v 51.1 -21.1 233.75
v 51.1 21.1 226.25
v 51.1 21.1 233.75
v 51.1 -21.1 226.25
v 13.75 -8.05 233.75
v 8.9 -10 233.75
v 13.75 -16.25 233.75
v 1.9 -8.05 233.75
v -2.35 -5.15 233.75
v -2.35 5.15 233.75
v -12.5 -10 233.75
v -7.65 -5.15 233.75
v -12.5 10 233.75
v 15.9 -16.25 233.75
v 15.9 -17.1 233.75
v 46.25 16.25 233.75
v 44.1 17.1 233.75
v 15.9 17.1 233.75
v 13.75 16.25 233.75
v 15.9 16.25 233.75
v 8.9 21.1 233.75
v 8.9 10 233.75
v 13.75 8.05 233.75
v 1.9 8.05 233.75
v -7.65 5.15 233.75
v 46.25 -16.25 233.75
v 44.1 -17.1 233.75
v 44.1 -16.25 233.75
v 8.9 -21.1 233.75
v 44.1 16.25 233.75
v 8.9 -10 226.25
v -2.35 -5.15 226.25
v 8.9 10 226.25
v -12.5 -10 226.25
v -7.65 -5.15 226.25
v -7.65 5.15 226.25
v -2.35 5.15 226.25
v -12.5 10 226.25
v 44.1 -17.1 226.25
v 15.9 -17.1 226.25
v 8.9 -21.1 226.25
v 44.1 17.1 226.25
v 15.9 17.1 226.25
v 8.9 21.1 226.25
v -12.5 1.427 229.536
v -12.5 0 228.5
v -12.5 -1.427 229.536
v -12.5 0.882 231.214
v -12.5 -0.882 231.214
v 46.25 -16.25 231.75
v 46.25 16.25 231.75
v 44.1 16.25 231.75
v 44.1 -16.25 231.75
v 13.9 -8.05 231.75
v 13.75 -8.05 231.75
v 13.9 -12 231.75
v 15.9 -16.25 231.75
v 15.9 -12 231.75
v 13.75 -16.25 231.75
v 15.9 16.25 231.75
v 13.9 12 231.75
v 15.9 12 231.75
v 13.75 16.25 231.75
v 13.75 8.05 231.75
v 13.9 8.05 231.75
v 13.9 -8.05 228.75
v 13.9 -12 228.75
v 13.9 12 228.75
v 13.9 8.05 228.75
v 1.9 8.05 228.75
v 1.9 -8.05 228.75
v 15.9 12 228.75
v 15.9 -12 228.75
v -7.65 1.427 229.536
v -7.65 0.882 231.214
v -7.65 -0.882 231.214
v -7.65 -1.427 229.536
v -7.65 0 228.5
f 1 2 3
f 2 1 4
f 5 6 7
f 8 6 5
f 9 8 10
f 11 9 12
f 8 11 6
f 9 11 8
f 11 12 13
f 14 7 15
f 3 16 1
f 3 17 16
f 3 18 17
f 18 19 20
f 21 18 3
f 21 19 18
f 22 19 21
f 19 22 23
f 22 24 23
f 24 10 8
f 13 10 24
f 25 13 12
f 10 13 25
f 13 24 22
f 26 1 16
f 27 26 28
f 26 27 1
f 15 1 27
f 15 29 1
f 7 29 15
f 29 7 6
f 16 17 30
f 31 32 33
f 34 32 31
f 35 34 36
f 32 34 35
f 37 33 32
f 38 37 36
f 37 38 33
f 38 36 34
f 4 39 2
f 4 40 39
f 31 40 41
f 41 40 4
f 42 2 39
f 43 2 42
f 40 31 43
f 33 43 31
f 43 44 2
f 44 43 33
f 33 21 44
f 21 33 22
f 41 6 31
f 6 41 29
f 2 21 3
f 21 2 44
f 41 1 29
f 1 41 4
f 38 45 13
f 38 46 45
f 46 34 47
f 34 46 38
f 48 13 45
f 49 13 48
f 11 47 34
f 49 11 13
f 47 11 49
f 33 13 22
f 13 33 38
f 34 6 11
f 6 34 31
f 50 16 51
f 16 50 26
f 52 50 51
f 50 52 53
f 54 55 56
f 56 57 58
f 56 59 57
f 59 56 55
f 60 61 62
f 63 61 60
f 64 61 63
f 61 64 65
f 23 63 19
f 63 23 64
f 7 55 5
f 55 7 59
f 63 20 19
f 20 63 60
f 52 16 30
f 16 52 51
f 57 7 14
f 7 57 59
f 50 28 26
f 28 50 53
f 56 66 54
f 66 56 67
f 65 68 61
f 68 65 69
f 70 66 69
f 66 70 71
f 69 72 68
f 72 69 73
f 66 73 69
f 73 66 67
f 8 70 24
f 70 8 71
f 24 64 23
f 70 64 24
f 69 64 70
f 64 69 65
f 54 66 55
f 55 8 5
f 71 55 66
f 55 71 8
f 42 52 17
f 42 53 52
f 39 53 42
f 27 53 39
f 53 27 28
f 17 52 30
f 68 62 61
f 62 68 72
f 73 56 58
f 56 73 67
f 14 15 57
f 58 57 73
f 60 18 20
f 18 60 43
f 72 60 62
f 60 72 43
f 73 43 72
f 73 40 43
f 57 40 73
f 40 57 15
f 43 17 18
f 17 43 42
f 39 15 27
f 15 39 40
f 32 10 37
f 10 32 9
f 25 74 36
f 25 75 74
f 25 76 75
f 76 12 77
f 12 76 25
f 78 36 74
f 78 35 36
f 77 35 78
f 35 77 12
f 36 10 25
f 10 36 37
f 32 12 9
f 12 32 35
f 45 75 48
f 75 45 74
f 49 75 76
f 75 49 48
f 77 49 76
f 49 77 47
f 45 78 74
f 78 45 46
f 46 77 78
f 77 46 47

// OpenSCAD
/////////////////////////////////////////////////////////////////////////////////
/// FlyPi v0.97; 2015 05 27 ///
/// Collaboration Tom Baden, Lucia Prieto Godino and Andre Maia Chagas
/// 3D model by Tom Baden (thingyverse ID: tbaden) ///
/// thomas.baden@uni-tuebingen.de ///
/// tombaden.wordpress.com ///
/////////////////////////////////////////////////////////////////////////////////
//// SWITCHES //////////
PartA = 	0; // Base
PartA1=	0; // Base clamps
PartA2 = 	0; // Feet
PartB= 	    0; // Wall
PartB3=	0; // PCB mount
PartC= 	0; // Cam Mount
PartC1= 	0; // Cam Mount Servo
PartC2= 	0; // Cam Mount Cogwheels
PartC3=    1; // Cam V2 Mount 
PartD= 	0; // High Power LED mount
PartE= 	    0; // angled mounting stick
PartF1= 	0; // straight mounting stick, long
PartF2= 	0; // straight mounting stick, short
PartF3= 	0; // straight mounting stick, long 90°
PartG= 	0; // thumbscrew & manipulator links
PartH= 	0; // AdaFruit 8x8 LED Matrix mount
PartI= 	    0; // Adafruit 12 LED Ring mount
PartJ1= 	0; // Mini Petri dish mount
PartJ2= 	0; // Midi Petri dish mount
PartK= 	0; // Diffusor mount
PartL1= 	0; // microscope slide chamber small
PartL2= 	0; // microscope slide chamber big
PartM= 	0; // Fluorescence Excitation light mount
PartN= 	0; // Fluorescence Exitaton tube plug
PartO= 	0; // Fluorescence Emission mount and wheel

/////////////////////////////////////////////////////////////////////////////////
///// KEY VARIABLES ////////////////////////////////////////////
/////////////////////////////////////////////////////////////////////////////////
sep = 30; // How far apart do pieces "float" in the model
Walls = 5; // Global thickness of all walls
Tol = 0.15; // Global gap between all parts that need to slide

// Base and mainwall details
T_cableZ = 4; // Module A, height of thermistor cable slid
T_cableY = 12; // Module A,width of thermistor cable slid
T_cable_offset = 8; // Module A, lateral displacement of thermistor cable slid
MarkerLED_R = 3+Tol; // Module A, radius of RGB LED hole in base
MarkerLED_Z = 2; // Module A, depth beneath surface
MarkerLED_XY = 4; // Module A, viewhole size
Sidestand = 70; // Module A, extension in X dimension at the back of the base
Sidestand_thickness = Walls; // Module A, thickness of extension at back of base
Borders = 15; // Module B, thickness of borders on the back (saves plastic)
Walls_thinning = 4; // Module B, how much thinner than "Walls" is thin part (saves plastic)

//Peltier dimensions
P_XY = 40+1; // Size of the Peltier
P_Z = 3; // Thickness of the Peltier
P_border = 12; // Extension in X dimension of base next to Peltier
P_ridge = 2; // below Peltier, width of ridge
P_cable = 3; // thickness of Peltier cable slid

//Raspberry Pi type (mounting parameters)
RPi_Width = 56+Walls*2; // Dimensions of the RPi 2 (below also for RPi 2)
RPi_groundZ = 17; // 65; for RPi B (not RPi B+)
RPi_holedist_Y = 49/2; // 15.5; // for RPi B (not RPi B+)
RPi_holedist_Yb = 49/2; //-10; // for RPi B (not RPi B+)
RPi_holedist_Z = 58; //54.5; // for RPi B (not RPi B+)
Tube_wall = 1.5;
S_hole_R = 1.5;
S_mount_R = 4;
Mount_h = 19; // RPi2 mount

// RPi Camera Type
Cam_X = 32.2;//24 for "classic RPi Cam. i.e the one without the adjustable focus lens";
Cam_Y = 32.2;//25 for "classic RPi Cam";
Cam_X_offset = 0;// 2.5 for "classic RPi Cam";
C_Z = 2; // thickness of camera mount
C_Z2 = 5; // thickness of cmaera mount walls
C_ridge = 2; // width of ridge for camera mount
Cam_Zfloat = 200; // Module B, max height 
CamGroove_X = 12;
CamGroove_Y = 16.1;
CamGroove2_Y = 24;


/////////////////////////////////////////////////////////////////////////////////
/// MODULE A - base   //////////////////////////////////////////
/////////////////////////////////////////////////////////////////////////////////

A_Base_X = P_XY+P_border*2 + Walls + Sidestand;
A_Base_Y = RPi_Width;
A_Base_Z = 19;
A_Wall_X = Walls;
A_Wall_Y = A_Base_Y;
A_Wall_Y_long = 10;
A_Wall_Z = RPi_groundZ+RPi_holedist_Z+25;
A_Wall_Z_long = Cam_Zfloat+Walls;
A_extramount_Z = 100;
Stabiliser_R = 12;
Airhole_R = 6;
Airhole_spacing = 13;
A1_screw_R = 1.5;
A1_offset = 3;

module A(){
	translate([-A_Base_X/2+P_XY/2+P_border,0,-A_Base_Z/2]){cube([A_Base_X,A_Base_Y,A_Base_Z], center = true );} // BASE
	translate([-P_XY/2-P_border-Walls/2,A_Base_Y/2-Walls+Tol/2,0]){rotate ([90,0,0]) {cylinder($fn = 50, r = Stabiliser_R, h = Walls*2-Tol, center = true );}} // Support1	
	translate([-P_XY/2-P_border-Walls/2,-A_Base_Y/2+Walls-Tol/2,0]){rotate ([90,0,0]) {cylinder($fn = 50, r = Stabiliser_R, h = Walls*2-Tol, center = true );}} // Support2	
}
module A_sub(){
	translate([0,0,-P_Z/2]){cube([P_XY+2*Tol,P_XY+2*Tol,P_Z], center = true );} // Peltier groove
	translate([-A_Base_Y/4,(P_XY+2*Tol)/2-(P_cable+2*Tol)/2,-P_Z/2]){cube([A_Base_Y,P_cable+2*Tol,P_Z], center = true );} // Peltier cable1
	translate([-A_Base_Y/4,-(P_XY+2*Tol)/2+(P_cable+2*Tol)/2,-P_Z/2]){cube([A_Base_Y,P_cable+2*Tol,P_Z], center = true );} // Peltier cable1
	translate([-A_Base_Y/2,0,-MarkerLED_R-MarkerLED_Z]){rotate ([0,90,0]) {cylinder($fn = 50, r = MarkerLED_R, h = A_Base_Y, center = true );}} // MarkerLed HOLE
	translate([-P_XY/2-MarkerLED_XY/2-1,0,-MarkerLED_Z]){cube([MarkerLED_XY,MarkerLED_XY,2*MarkerLED_Z], center = true );} // MarkerLed opening
	translate([0,0,-A_Base_Z/2]){cube([P_XY-P_ridge*2,P_XY-P_ridge*2,A_Base_Z], center = true );} // Peltier below
	translate([-A_Base_X/2-Walls,0,-A_Base_Z/2]){cube([Sidestand-Walls*3,A_Base_Y-Walls*2,A_Base_Z], center = true );} // Sidestand Hole
	translate([-A_Base_X/2-Walls/2-Walls,0,-A_Base_Z/2+Sidestand_thickness]){cube([Sidestand-Walls*2,A_Base_Y,A_Base_Z], center = true );} // Sidestand Hole shallow
	translate([-P_XY/2-P_border-Walls/2,0,-A_Base_Z/2]){cube([Walls+Tol*2,A_Base_Y-Walls*4,A_Base_Z], center = true );} // Wall_linkhole
	translate([-P_XY/2-P_border-A_Wall_X/2,0,A_Wall_Z/2]){cube([A_Wall_X+Tol*2,A_Wall_Y,A_Wall_Z], center = true );} // Sidestand_slot
	translate([Airhole_spacing,0,-A_Base_Z/2]){rotate ([90,90,0]) {cylinder(r = Airhole_R, h = A_Base_Y, center = true );}} // Air holes
	translate([0,0,-A_Base_Z/2]){rotate ([90,90,0]) {cylinder(r = Airhole_R, h = A_Base_Y, center = true );}} // Air holes
	translate([-Airhole_spacing,0,-A_Base_Z/2]){rotate ([90,90,0]) {cylinder(r = Airhole_R, h = A_Base_Y, center = true );}} // Air holes
	translate([+A_Base_Y/2,0,-A_Base_Z/2]){rotate ([0,90,0]) {cylinder(r = Airhole_R, h = A_Base_Y, center = true );}} // Air holes
	translate([0,-Airhole_spacing,-A_Base_Z/2]){rotate ([0,90,0]) {cylinder(r = Airhole_R, h = A_Base_Y, center = true );}} // Air holes
	translate([0,Airhole_spacing,-A_Base_Z/2]){rotate ([0,90,0]) {cylinder(r = Airhole_R, h = A_Base_Y, center = true );}} // Air holes
	translate([-(P_XY/2-A1_offset),P_XY/2+A1_offset,-Walls]){rotate ([0,0,0]) {cylinder($fn=20, r = A1_screw_R, h = Walls*2, center = true );}} // screwhole
	translate([-(P_XY/2-A1_offset),-(P_XY/2+A1_offset),-Walls]){rotate ([0,0,0]) {cylinder($fn=20,r = A1_screw_R, h = Walls*2, center = true );}} // screwhole
	translate([(P_XY/2-A1_offset),P_XY/2+A1_offset,-Walls]){rotate ([0,0,0]) {cylinder($fn=20,r = A1_screw_R, h = Walls*2, center = true );}} // screwhole
	translate([(P_XY/2-A1_offset),-(P_XY/2+A1_offset),-Walls]){rotate ([0,0,0]) {cylinder($fn=20,r = A1_screw_R, h = Walls*2, center = true );}} // screwhole
}
if (PartA==1){difference(){A();A_sub();}}

/////////////////////////////////////////////////////////////////////////////////
//// MODULE A1 - thermistor /Peltier clamps /////
/////////////////////////////////////////////////////////////////////////////////

module A1(){
	translate([P_XY/2-A1_offset,P_XY/2+A1_offset,Walls*2]){cube([A1_offset*2,A1_offset*5,Walls/3], center = true );} // clamp
	translate([P_XY/2-A1_offset,P_XY/2+A1_offset*3,Walls*2-Walls/3]){cube([A1_offset*2,A1_offset,Walls/3], center = true );} // clamp
	translate([P_XY/2-A1_offset,-P_XY/2-A1_offset,Walls*2]){cube([A1_offset*2,A1_offset*5,Walls/3], center = true );} // clamp
	translate([P_XY/2-A1_offset,-P_XY/2-A1_offset*3,Walls*2-Walls/3]){cube([A1_offset*2,A1_offset,Walls/3], center = true );} // clamp
	translate([-P_XY/2+A1_offset,-P_XY/2-A1_offset,Walls*2]){cube([A1_offset*2,A1_offset*5,Walls/3], center = true );} // clamp
	translate([-P_XY/2+A1_offset,-P_XY/2-A1_offset*3,Walls*2-Walls/3]){cube([A1_offset*2,A1_offset,Walls/3], center = true );} // clamp
      translate([-P_XY/2+A1_offset,P_XY/2+A1_offset/4,Walls*2]){cube([A1_offset*2,A1_offset*6.5,Walls/3], center = true );} // Thermistor clamp
	translate([-P_XY/2+A1_offset,P_XY/2+A1_offset*3,7]){cube([A1_offset*2,A1_offset,5], center = true );} // Thermistor clamp footbig
	translate([-P_XY/2+A1_offset,P_XY/2-A1_offset*2.5,Walls*2-Walls/3]){cube([A1_offset*2,A1_offset,Walls/3], center = true );} // clamp
}
module A1_sub(){
	translate([-(P_XY/2-A1_offset),P_XY/2+A1_offset,Walls*2]){rotate ([0,0,0]) {cylinder($fn=20,r = A1_screw_R, h = Walls/2, center = true );}} // screwhole
	translate([-(P_XY/2-A1_offset),-(P_XY/2+A1_offset),Walls*2]){rotate ([0,0,0]) {cylinder($fn=20,r = A1_screw_R, h = Walls/2, center = true );}} // screwhole
	translate([(P_XY/2-A1_offset),P_XY/2+A1_offset,Walls*2]){rotate ([0,0,0]) {cylinder($fn=20,r = A1_screw_R, h = Walls/2, center = true );}} // screwhole
	translate([(P_XY/2-A1_offset),-(P_XY/2+A1_offset),Walls*2]){rotate ([0,0,0]) {cylinder($fn=20,r = A1_screw_R, h = Walls/2, center = true );}} // screwhole
}
if (PartA1==1) {difference(){A1();A1_sub();}}

/////////////////////////////////////////////////////////////////////////////////
/// MODULE A2 - basefeet   /////////////////////////////////
/////////////////////////////////////////////////////////////////////////////////

A_Foot_Z = 30;
A_Foot_Groove_Z = 3;
A_Foot_Corners_XY = 10;

module A2(){
	translate([-A_Base_X/2+P_XY/2+P_border,0,-A_Foot_Z/2-sep]){cube([A_Base_X+Walls,A_Base_Y+Walls,A_Foot_Z], center = true );} // Main foot
	
}
module A2_sub(){
	//translate([0,0,-A_Foot_Z/2-sep]){cube([P_XY-P_ridge*2,P_XY-P_ridge*2,A_Foot_Z], center = true );} // Peltier below
	translate([-A_Base_X/2+P_XY/2+P_border,0,-A_Foot_Groove_Z/2-sep]){cube([A_Base_X+Tol,A_Base_Y+Tol,A_Foot_Groove_Z], center = true );} // BASE

	translate([-A_Base_X/2+P_XY/2+P_border,0,-A_Foot_Z/2-sep]){cube([A_Base_X-Walls,A_Base_Y-Walls,A_Foot_Z], center = true );} // Main Hole
	
	translate([-A_Base_X/2+P_XY/2+P_border,0,-A_Foot_Z/2+Walls/2-sep]){cube([A_Base_X-Walls-A_Foot_Corners_XY,A_Base_Y*2,A_Foot_Z-Walls], center = true );} // CornerCut Hole1
	translate([-A_Base_X/2+P_XY/2+P_border,0,-A_Foot_Z/2+Walls/2-sep]){cube([A_Base_X*2,A_Base_Y-Walls-A_Foot_Corners_XY,A_Foot_Z-Walls], center = true );}  // CornerCut Hole2


}
if (PartA2==1){difference(){A2();A2_sub();}}

/////////////////////////////////////////////////////////////////////////////////
///// MODULE B - main wall //////////////////////////////////
/////////////////////////////////////////////////////////////////////////////////

module B(){
	translate([-P_XY/2-P_border-A_Wall_X/2,0,A_Wall_Z/2+sep]){cube([A_Wall_X,A_Wall_Y,A_Wall_Z], center = true );} // WALL
	translate([-P_XY/2-P_border-A_Wall_X/2,0,A_Wall_Z_long/2+sep]){cube([A_Wall_X,A_Wall_Y_long,A_Wall_Z_long], center = true );} // WALL_extra
	translate([-P_XY/2-P_border-A_Wall_X/2,0,0.5+sep-A_Base_Z/2]){cube([Walls,A_Base_Y-Walls*4-Tol*2,A_Base_Z], center = true );} // WALL_link
	translate([-P_XY/2-P_border-A_Wall_X/2,0,A_Wall_Z+sep-A_Wall_Y/999]){rotate ([0,270,0]) {cylinder($fn = 3, r = A_Wall_Y/2, h = Walls, center = true );}} // WALL_rounding top
}
module B2(){
	translate([-P_XY/2-P_border+1.7*Walls-Mount_h,RPi_holedist_Yb,RPi_groundZ+sep]){rotate ([0,90,0]) {cylinder(r = S_mount_R, h = Mount_h, center = true );}} // m hole_bottom
	translate([-P_XY/2-P_border+1.7*Walls-Mount_h,RPi_holedist_Y,RPi_groundZ+RPi_holedist_Z+sep]){rotate ([0,90,0]) {cylinder(r = S_mount_R, h = Mount_h, center = true );}} // m hole_top
	translate([-P_XY/2-P_border+1.7*Walls-Mount_h,-RPi_holedist_Yb,RPi_groundZ+sep]){rotate ([0,90,0]) {cylinder(r = S_mount_R, h = Mount_h, center = true );}} // m hole_bottom
	translate([-P_XY/2-P_border+1.7*Walls-Mount_h,-RPi_holedist_Y,RPi_groundZ+RPi_holedist_Z+sep]){rotate ([0,90,0]) {cylinder(r = S_mount_R, h = Mount_h, center = true );}} // m hole_top
}
module B_sub(){
	translate([-A_Base_Y/4,(P_XY+2*Tol)/2-(P_cable+2*Tol)/2+P_cable/2,-P_Z/2+sep]){cube([A_Base_Y,P_cable*2+2*Tol,P_Z], center = true );} // Peltier cable1
	translate([-A_Base_Y/4,-(P_XY+2*Tol)/2+(P_cable+2*Tol)/2-P_cable/2,-P_Z/2+sep]){cube([A_Base_Y,P_cable*2+2*Tol,P_Z], center = true );} // Peltier cable2
	translate([-A_Base_Y/4,T_cable_offset,T_cableZ/2+Tol+sep]){cube([A_Base_Y,T_cableY,T_cableZ+2*Tol], center = true );} // thermistor cable
	translate([-A_Base_Y/2,0,-MarkerLED_R-MarkerLED_Z+sep]){rotate ([0,90,0]) {cylinder($fn = 50, r = MarkerLED_R, h = A_Base_Y, center = true );}} // MarkerLed HOLE
	translate([-P_XY/2-P_border-A_Wall_X/2-(Walls-Walls_thinning)/2,0,A_Wall_Z/2+sep]){cube([Walls_thinning,A_Wall_Y-Borders,A_Wall_Z-Borders], center = true );} // Save Material	
}
module B2_sub(){
	translate([-P_XY/2-P_border+Walls-Mount_h,RPi_holedist_Yb,RPi_groundZ+sep]){rotate ([0,90,0]) {cylinder($fn = 50, r = S_hole_R, h = Mount_h+Walls, center = true );}} // m hole_bottom
	translate([-P_XY/2-P_border+Walls-Mount_h,RPi_holedist_Y,RPi_groundZ+RPi_holedist_Z+sep]){rotate ([0,90,0]) {cylinder($fn = 50, r = S_hole_R, h = Mount_h+Walls, center = true );}} // 
	translate([-P_XY/2-P_border+Walls-Mount_h,-RPi_holedist_Yb,RPi_groundZ+sep]){rotate ([0,90,0]) {cylinder($fn = 50, r = S_hole_R, h = Mount_h+Walls, center = true );}} // m hole_bottom
	translate([-P_XY/2-P_border+Walls-Mount_h,-RPi_holedist_Y,RPi_groundZ+RPi_holedist_Z+sep]){rotate ([0,90,0]) {cylinder($fn = 50, r = S_hole_R, h = Mount_h+Walls, center = true );}} // 
}
if (PartB==1){difference(){B();B_sub();}}
if (PartB==1){difference(){B2();B2_sub();}}

/////////////////////////////////////////////////////////////////////////////////
///// MODULE B3 - Arduino/Fritzing holder ////////
/////////////////////////////////////////////////////////////////////////////////

Fritzing_X = 1.65;
Fritzing_Y = 76.75;
Fritzing_Z_depth = 3;
Mount2_h = 25;
Mount2_Z = 4;
Ard_holder_X = Walls*2 + Fritzing_X;
Ard_holder_Y = Fritzing_Y + 2*Walls;
Ard_z_extra = 5;
Ard_holder_Z = 2*S_mount_R+Ard_z_extra;
Foot_Z_extra = 2;
LShape_Length = 6;
LShape_Width = 3;

module B3(){
	translate([-P_XY/2-P_border-Ard_holder_X/2-2*sep,0,RPi_groundZ+sep+Ard_z_extra/2]){cube([Ard_holder_X,Ard_holder_Y,Ard_holder_Z], center = true );} // Holder
	translate([-P_XY/2-P_border+1.7*Walls-Mount_h-2*sep+Mount2_h/2,RPi_holedist_Yb,RPi_groundZ+sep-S_mount_R/2+Foot_Z_extra/2]){cube([Mount2_h,S_mount_R*2,S_mount_R+Foot_Z_extra], center = true );} // foot
	translate([-P_XY/2-P_border+1.7*Walls-Mount_h-2*sep+Mount2_h/2,-RPi_holedist_Yb,RPi_groundZ+sep-S_mount_R/2+Foot_Z_extra/2]){cube([Mount2_h,S_mount_R*2,S_mount_R+Foot_Z_extra], center = true );} // foot
}
module B3_sub(){
	translate([-P_XY/2-P_border-Ard_holder_X/2-2*sep,0,RPi_groundZ+Ard_holder_Z/2-Fritzing_Z_depth/2+sep]){cube([Fritzing_X+Tol,Fritzing_Y+2*Tol,Fritzing_Z_depth+Ard_z_extra], center = true );} // slot
	translate([-P_XY/2-P_border-Ard_holder_X/2-2*sep,0,RPi_groundZ+sep+Ard_holder_Z/2]){cube([Ard_holder_X,Fritzing_Y-2,Ard_z_extra], center = true );} // Holder
	translate([-P_XY/2-P_border+1.7*Walls-Mount_h-2*sep+Mount2_h/2,RPi_holedist_Yb,RPi_groundZ+sep]){rotate ([0,90,0]) {cylinder(r = S_hole_R, h = Mount2_h+5, center = true );}} // m hole_bottom
	translate([-P_XY/2-P_border+1.7*Walls-Mount_h-2*sep+Mount2_h/2,-RPi_holedist_Yb,RPi_groundZ+sep]){rotate ([0,90,0]) {cylinder(r = S_hole_R, h = Mount2_h+5, center = true );}} // m hole_bottom
    translate([-P_XY/2-P_border+1.7*Walls-Mount_h-2*sep+Mount2_h-LShape_Length/2,RPi_holedist_Yb-S_mount_R+LShape_Width/2,RPi_groundZ+sep-S_mount_R/2+Foot_Z_extra/2]){cube([LShape_Length,LShape_Width,S_mount_R+Foot_Z_extra], center = true );} // L-Shape
	translate([-P_XY/2-P_border+1.7*Walls-Mount_h-2*sep+Mount2_h-LShape_Length/2,-RPi_holedist_Yb+S_mount_R-LShape_Width/2,RPi_groundZ+sep-S_mount_R/2+Foot_Z_extra/2]){cube([LShape_Length,LShape_Width,S_mount_R+Foot_Z_extra], center = true );} // L-Shape    
}
if (PartB3==1){difference(){B3();B3_sub();}}

/////////////////////////////////////////////////////////////////////////////////
///// MODULE C - camera mount /////////////////////////
/////////////////////////////////////////////////////////////////////////////////

MiniGrooveX = 15;

module C(){
	translate([sep+Cam_X_offset,0,Cam_Zfloat+sep]){cube([Cam_X+Walls*2,Cam_Y+Walls*2,Walls*1.5], center = true );} // Cam_mount
	translate([sep-P_XY/4-P_border/2-Walls,0,Cam_Zfloat+sep]){cube([P_XY/2+P_border+2*Walls,A_Wall_Y_long+2*Walls,Walls*1.5], center = true );} // Cam_link
}
module C_sub(){
	translate([sep+Cam_X_offset,0,Cam_Zfloat+sep+Walls*0.75-C_Z/2]){cube([Cam_X+Tol*2,Cam_Y+Tol*2,C_Z], center = true );} // Cam_hole_ridge
	translate([sep+Cam_X_offset-Cam_X/2-CamGroove_X/2,0,Cam_Zfloat+sep+C_Z2/2]){cube([CamGroove_X,CamGroove_Y,C_Z2+Walls/2], center = true );} // Cam_cable_groove
	translate([sep+Cam_X_offset+Cam_X/2-MiniGrooveX/2-C_ridge,-Cam_Y/2+C_ridge/2,Cam_Zfloat+sep+C_Z2/2]){cube([MiniGrooveX,C_ridge,C_Z2+Walls/2], center = true );} // mini groove
	translate([sep+Cam_X_offset-Cam_X/2+CamGroove_X/2,0,Cam_Zfloat+sep+C_Z2/2]){cube([CamGroove_X,CamGroove2_Y,C_Z2+Walls/2], center = true );} // Cam_bmup_groove
	translate([sep+Cam_X_offset,0,Cam_Zfloat+sep]){cube([Cam_X-C_ridge*2,Cam_Y-C_ridge*2,Walls*3], center = true );} // Cam_hole
	translate([sep-P_XY/2-P_border-Walls/2,0,Cam_Zfloat+sep]){cube([Walls+Tol*2,A_Wall_Y_long+2*Tol,Walls*1.5], center = true );} // Cam_link_hole
	translate([sep-Cam_X/2-CamGroove_X-15,0,Cam_Zfloat+sep]){rotate ([0,90,0]) {cylinder(r = S_hole_R, h = 20, center = true );}} // screwhole
}
if (PartC==1){difference(){C();C_sub();}}


/////////////////////////////////////////////////////////////////////////////////
///// MODULE C1 - camera mount with servo ////
/////////////////////////////////////////////////////////////////////////////////

Servo_Y = 12.2;
Servo_X = 23.7;
Servo_X_offset = 5.5;
// height of Servo is 29 in total, which is counted from the bottom
cogwheel_R = 14.1;
cogwheel_R2 = 10.5;
cogwheel_Z = 10;
cogwheel_Z2 = 4;
cogwheel_nteeth = 30; // should be divisible by 3
cogwheel_R_inner1 = 7+Tol; // camera radius
cogwheel_R_inner2 = 3.7+Tol/2; // servo axis radius
cogwheel_cross_Z = 3;
cogwheel_cross_Width = 4.5+Tol;
cogwheel_cross_Length = cogwheel_R2*2-1;

module C1(){
	translate([sep+Cam_X_offset,-2*sep-Walls/2-Servo_Y/2,Cam_Zfloat+sep]){cube([Cam_X+Walls*2,Cam_Y+Servo_Y+Walls*3,Walls*1.5], center = true );} // Cam_mount
	translate([sep-P_XY/4-P_border/2-Walls,-2*sep,Cam_Zfloat+sep]){cube([P_XY/2+P_border+2*Walls,A_Wall_Y_long+2*Walls,Walls*1.5], center = true );} // Cam_link

}
module C1_sub(){
	translate([sep+Cam_X_offset,-2*sep,Cam_Zfloat+sep+Walls*0.75-C_Z/2]){cube([Cam_X+Tol*2,Cam_Y+Tol*2,C_Z], center = true );} // Cam_hole_ridge
	translate([sep+Cam_X_offset-Cam_X/2-CamGroove_X/2,-2*sep,Cam_Zfloat+sep+C_Z2/2]){cube([CamGroove_X,CamGroove_Y,C_Z2+Walls/2], center = true );} // Cam_cable_groove
	translate([sep+Cam_X_offset+Cam_X/2-MiniGrooveX/2-C_ridge,-Cam_Y/2+C_ridge/2-2*sep,Cam_Zfloat+sep+C_Z2/2]){cube([MiniGrooveX,C_ridge,C_Z2+Walls/2], center = true );} // mini groove
	translate([sep+Cam_X_offset-Cam_X/2+CamGroove_X/2,-2*sep,Cam_Zfloat+sep+C_Z2/2]){cube([CamGroove_X,CamGroove2_Y,C_Z2+Walls/2], center = true );} // Cam_bmup_groove
	translate([sep+Cam_X_offset,-2*sep,Cam_Zfloat+sep]){cube([Cam_X-C_ridge*2,Cam_Y-C_ridge*2,Walls*3], center = true );} // Cam_hole
	translate([sep-P_XY/2-P_border-Walls/2,-2*sep,Cam_Zfloat+sep]){cube([Walls+Tol*2,A_Wall_Y_long+2*Tol,Walls*1.5], center = true );} // Cam_link_hole
	translate([sep-Cam_X/2-CamGroove_X-15,-2*sep,Cam_Zfloat+sep]){rotate ([0,90,0]) {cylinder(r = S_hole_R, h = 20, center = true );}} // screwhole
      translate([sep+Cam_X_offset-Servo_X_offset,-2*sep-Servo_Y/2-Cam_Y/2-Walls,Cam_Zfloat+sep]){cube([Servo_X+Tol,Servo_Y+Tol,Walls*3], center = true );} // Servo_hole
 translate([sep+Cam_X_offset-Servo_X_offset+Servo_X/2,-2*sep-Servo_Y/2-Cam_Y/2-Walls,Cam_Zfloat+sep]){cylinder( $fn=50, r = 4, h = 100, center = true );} // Servo_cablegroove

}
if (PartC1==1){difference(){C1();C1_sub();}}

module C2(){
      for (i = [0 : cogwheel_nteeth/3]) {
		translate([sep+Cam_X_offset,-2*sep,Cam_Zfloat+2*sep]){rotate ([0,0,(i+0.5)*360/cogwheel_nteeth]) {cylinder($fn = 3, r = cogwheel_R, h = cogwheel_Z, center = true );}} // cogs wheel 1
		translate([sep+Cam_X_offset,-2*sep-Servo_Y/2-Cam_Y/2-Walls,Cam_Zfloat+2*sep]){rotate ([0,0,i*360/cogwheel_nteeth]) {cylinder($fn = 3, r = cogwheel_R, h = cogwheel_Z, center = true );}} // cogs wheel 2
	}
}
module C2_sub(){
	translate([sep+Cam_X_offset,-2*sep,Cam_Zfloat+2*sep]){rotate ([0,0,0]) {cylinder($fn = 50, r = cogwheel_R_inner1, h = cogwheel_Z+1, center = true );}} // Cam_cog Lens hole 
	translate([sep+Cam_X_offset,-2*sep,Cam_Zfloat+2*sep+cogwheel_Z2/2+1]){rotate ([0,0,0]) {cylinder($fn = 50, r = cogwheel_R2, h = cogwheel_Z-cogwheel_Z2+1, center = true );}} // Cam_cog main hole
	
	translate([sep+Cam_X_offset,-2*sep-Servo_Y/2-Cam_Y/2-Walls,Cam_Zfloat+2*sep+cogwheel_Z2/2+1]){rotate ([0,0,0]) {cylinder($fn = 50, r = cogwheel_R2, h = cogwheel_Z - cogwheel_Z2+1, center = true );}} // Servo_cog main hole
	translate([sep+Cam_X_offset,-2*sep-Servo_Y/2-Cam_Y/2-Walls,Cam_Zfloat+2*sep]){rotate ([0,0,0]) {cylinder($fn = 12, r = cogwheel_R_inner2, h = cogwheel_Z+1, center = true );}} // Servo_cog mount hole
	translate([sep+Cam_X_offset,-2*sep-Servo_Y/2-Cam_Y/2-Walls,Cam_Zfloat+2*sep-cogwheel_cross_Z/2]){cube([cogwheel_cross_Length,cogwheel_cross_Width,cogwheel_cross_Z], center = true);} // Servo_cog cross1
	translate([sep+Cam_X_offset,-2*sep-Servo_Y/2-Cam_Y/2-Walls,Cam_Zfloat+2*sep-cogwheel_cross_Z/2]){cube([cogwheel_cross_Width,cogwheel_cross_Length,cogwheel_cross_Z], center = true);} // Servo_cog cross2

}
if (PartC2==1){difference(){C2();C2_sub();}}

/////////////////////////////////////////////////////////////////////////////////
///// MODULE C3 - camera mount /////////////////////////
/////////////////////////////////////////////////////////////////////////////////

MiniGrooveX = 15;

module C3(){
	translate([sep+Cam_X_offset,0,Cam_Zfloat+sep]){cube([Cam_X+Walls*2,Cam_Y+Walls*2,Walls*1.5], center = true );} // Cam_mount
	translate([sep-P_XY/4-P_border/2-Walls,0,Cam_Zfloat+sep]){cube([P_XY/2+P_border+2*Walls,A_Wall_Y_long+2*Walls,Walls*1.5], center = true );} // Cam_link
}
module C3_sub(){
	translate([sep+Cam_X_offset,0,Cam_Zfloat+sep+Walls*0.75-C_Z/2]){cube([Cam_X+Tol*2,Cam_Y+Tol*2,C_Z], center = true );} // Cam_hole_ridge
	translate([sep+Cam_X_offset-Cam_X/2-CamGroove_X/2,0,Cam_Zfloat+sep+C_Z2/2]){cube([CamGroove_X,CamGroove_Y,C_Z2+Walls/2], center = true );} // Cam_cable_groove
	translate([sep+Cam_X_offset+Cam_X/2-MiniGrooveX/2-C_ridge,-Cam_Y/2+C_ridge/2,Cam_Zfloat+sep+C_Z2/2]){cube([MiniGrooveX,C_ridge,C_Z2+Walls/2], center = true );} // mini groove
	translate([sep+Cam_X_offset-Cam_X/2+CamGroove_X/2,0,Cam_Zfloat+sep+C_Z2/2]){cube([CamGroove_X,CamGroove2_Y,C_Z2+Walls/2], center = true );} // Cam_bmup_groove
	translate([sep+Cam_X_offset,0,Cam_Zfloat+sep]){cube([Cam_X-C_ridge*2,Cam_Y--2,Walls*3], center = true );} // Cam_hole
	translate([sep-P_XY/2-P_border-Walls/2,0,Cam_Zfloat+sep]){cube([Walls+Tol*2,A_Wall_Y_long+2*Tol,Walls*1.5], center = true );} // Cam_link_hole
	translate([sep-Cam_X/2-CamGroove_X-15,0,Cam_Zfloat+sep]){rotate ([0,90,0]) {cylinder(r = S_hole_R, h = 20, center = true );}} // screwhole
}
if (PartC3==1){difference(){C3();C3_sub();}}

/////////////////////////////////////////////////////////////////////////////////
///// MODULE D - high power LED mount  /////////
/////////////////////////////////////////////////////////////////////////////////

Tube_wall = 1.5;
LED_holder_inside = 35+2*Tol;
LED_holder_outside = 35+2*Tol+2*Walls;
LED_holder_ridge = 3;

module D(){
	translate([sep+Cam_X_offset,0,Cam_Zfloat]){cube([Cam_X+Walls*2,Cam_Y+Walls*2,Walls*1.5], center = true );} // Cam_mount
	translate([sep-P_XY/4-P_border/2-Walls,0,Cam_Zfloat]){cube([P_XY/2+P_border+2*Walls,A_Wall_Y_long+2*Walls,Walls*1.5], center = true );} // Cam_link
}
module D_sub(){
	translate([sep+Cam_X_offset,0,Cam_Zfloat]){cylinder(r = Excit_hole_R+Tube_wall+Tol, h = Walls*2, center = true );} 
	translate([sep+Cam_X_offset,0,Cam_Zfloat+Walls*0.4]){cube([LED_holder_inside,LED_holder_inside,Walls], center = true );} // LED_holder_groove2
	translate([sep-P_XY/2-P_border-Walls/2,0,Cam_Zfloat]){cube([Walls+Tol*2,A_Wall_Y_long+2*Tol,Walls*1.5], center = true );} // Cam_link_hole
	translate([sep-Cam_X/2-CamGroove_X-15,0,Cam_Zfloat]){rotate ([0,90,0]) {cylinder(r = S_hole_R, h = 20, center = true );}} // screwhole
}
if (PartD==1){difference(){D();D_sub();}}

/////////////////////////////////////////////////////////////////////////////////
///// MODULE E - angled pillars  //////////////////////////
/////////////////////////////////////////////////////////////////////////////////

E_Y_extra = 35;
E_Z_extra = 40;
E_extra_angle = -40;
E_extra_angle2 = -30;

module E(){
		translate([-P_XY/2-P_border-Walls/2,2*sep,Cam_Zfloat]){cube([3*Walls,A_Wall_Y_long+2*Walls,Walls*1.5], center = true );} // Cam_link
		translate([-P_XY/2-P_border-Walls/2,2*sep+E_Y_extra/2,Cam_Zfloat]){cube([Walls,A_Wall_Y_long+2*Walls+E_Y_extra,Walls*1.5], center = true );} // Arm
            translate([-P_XY/2-P_border-A_Wall_X/2,2*sep+E_Y_extra-sin(E_extra_angle)*E_Z_extra-10,Cam_Zfloat+E_Z_extra/2-5]) {rotate ([E_extra_angle,0,0]) {cube([A_Wall_X,A_Wall_Y_long,E_Z_extra], center = true );}} // W_extra1
		translate([-P_XY/2-P_border-A_Wall_X/2,2*sep+E_Y_extra-15-sin(E_extra_angle2)*E_Z_extra-10,Cam_Zfloat+E_Z_extra/2-3]) {rotate ([E_extra_angle2,0,0]) {cube([A_Wall_X,A_Wall_Y_long*0.6,E_Z_extra], center = true );}} // W_extra2
}
module E_sub(){
	translate([-P_XY/2-P_border-Walls/2,2*sep,Cam_Zfloat]){cube([Walls+Tol*2,A_Wall_Y_long+2*Tol,Walls*10], center = true );} // Cam_link_hole
	translate([-Cam_X/2-CamGroove_X-15,2*sep,Cam_Zfloat]){rotate ([0,90,0]) {cylinder(r = S_hole_R, h = 100, center = true );}} // screwhole
}
if (PartE==1){difference(){E();E_sub();}}

/////////////////////////////////////////////////////////////////////////////////
///// MODULE F1 - extra pillar stick 1 //////////////////
/////////////////////////////////////////////////////////////////////////////////

F_Plug_X = 15;
Airhole_R2 = 4;

module F1(){
	translate([0,-A_Base_Y/2-A_Wall_X/2-sep,A_extramount_Z/2+10-A_Base_Z/2]){cube([A_Wall_Y_long,A_Wall_X,A_extramount_Z+20+A_Base_Z], center = true );} // low_mount
	translate([0,-A_Base_Y/2-A_Wall_X/2-sep,-A_Base_Z/2]){cube([A_Wall_Y_long*4,A_Wall_X,A_Base_Z], center = true );} // low_mount
	translate([Airhole_spacing,-A_Base_Y/2-A_Wall_X/2-sep+F_Plug_X/2,-A_Base_Z/2]){rotate ([90,90,0]) {cylinder(r = Airhole_R-Tol, h = F_Plug_X, center = true );}} // Plug hole1
	translate([0,-A_Base_Y/2-A_Wall_X/2-sep+F_Plug_X/2,-A_Base_Z/2]){rotate ([90,90,0]) {cylinder(r = Airhole_R-Tol, h = F_Plug_X, center = true );}} // Plug hole2
	translate([-Airhole_spacing,-A_Base_Y/2-A_Wall_X/2-sep+F_Plug_X/2,-A_Base_Z/2]){rotate ([90,90,0]) {cylinder(r = Airhole_R-Tol, h = F_Plug_X, center = true );}} // Plug hole3
}
module F1_sub(){
	translate([Airhole_spacing,-A_Base_Y/2-A_Wall_X/2-sep+F_Plug_X/2,-A_Base_Z/2]){rotate ([90,90,0]) {cylinder(r = Airhole_R-Tube_wall, h = F_Plug_X*2, center = true );}} // Air holes
	translate([0,-A_Base_Y/2-A_Wall_X/2-sep+F_Plug_X/2,-A_Base_Z/2]){rotate ([90,90,0]) {cylinder(r = Airhole_R-Tube_wall, h = F_Plug_X*2, center = true );}} // Air holes
	translate([-Airhole_spacing,-A_Base_Y/2-A_Wall_X/2-sep+F_Plug_X/2,-A_Base_Z/2]){rotate ([90,90,0]) {cylinder(r = Airhole_R-Tube_wall, h = F_Plug_X*2, center = true );}} // Air holes
}
if (PartF1==1){difference(){F1();F1_sub();}}

/////////////////////////////////////////////////////////////////////////////////
///// MODULE F2 - extra pillar stick 2 (mini)    ////
/////////////////////////////////////////////////////////////////////////////////

Ministick_Z = 15;

module F2(){
	translate([2*sep,-A_Base_Y/2-A_Wall_X/2-sep,Ministick_Z/2-A_Base_Z/2]){cube([A_Wall_Y_long,A_Wall_X,A_Base_Z+Ministick_Z], center = true );} // low_mount
	translate([2*sep,-A_Base_Y/2-A_Wall_X/2-sep,-A_Base_Z/2]){cube([A_Wall_Y_long*4,A_Wall_X,A_Base_Z], center = true );} // low_mount
	translate([2*sep+Airhole_spacing,-A_Base_Y/2-A_Wall_X/2-sep+F_Plug_X/2,-A_Base_Z/2]){rotate ([90,90,0]) {cylinder(r = Airhole_R-Tol, h = F_Plug_X, center = true );}} // Plug hole1
	translate([2*sep,-A_Base_Y/2-A_Wall_X/2-sep+F_Plug_X/2,-A_Base_Z/2]){rotate ([90,90,0]) {cylinder(r = Airhole_R-Tol, h = F_Plug_X, center = true );}} // Plug hole2
	translate([2*sep-Airhole_spacing,-A_Base_Y/2-A_Wall_X/2-sep+F_Plug_X/2,-A_Base_Z/2]){rotate ([90,90,0]) {cylinder(r = Airhole_R-Tol, h = F_Plug_X, center = true );}} // Plug hole3
}
module F2_sub(){
	translate([2*sep+Airhole_spacing,-A_Base_Y/2-A_Wall_X/2-sep+F_Plug_X/2,-A_Base_Z/2]){rotate ([90,90,0]) {cylinder(r = Airhole_R-Tube_wall, h = F_Plug_X*2, center = true );}} // Air holes
	translate([2*sep,-A_Base_Y/2-A_Wall_X/2-sep+F_Plug_X/2,-A_Base_Z/2]){rotate ([90,90,0]) {cylinder(r = Airhole_R-Tube_wall, h = F_Plug_X*2, center = true );}} // Air holes
	translate([2*sep-Airhole_spacing,-A_Base_Y/2-A_Wall_X/2-sep+F_Plug_X/2,-A_Base_Z/2]){rotate ([90,90,0]) {cylinder(r = Airhole_R-Tube_wall, h = F_Plug_X*2, center = true );}} // Air holes
}
if (PartF2==1){difference(){F2();F2_sub();}}


/////////////////////////////////////////////////////////////////////////////////
///// MODULE F1 - extra pillar stick 1 //////////////////
/////////////////////////////////////////////////////////////////////////////////


module F3(){
	translate([0,-A_Base_Y/2-A_Wall_X/2-sep,A_extramount_Z/2.5+-A_Base_Z]){
        cube([A_Wall_Y_long,A_Wall_X,A_extramount_Z/2], center = true );} // low_mount
    
    translate([0,A_Base_Y/2-A_Wall_X*17,A_extramount_Z/2.5+13-A_Base_Z/2]){
        rotate([90,0,0]){
        cube([A_Wall_Y_long,A_Wall_X,A_extramount_Z/4], center = true );}} // 90°
	translate([0,-A_Base_Y/2-A_Wall_X/2-sep,-A_Base_Z/2]){cube([A_Wall_Y_long*4,A_Wall_X,A_Base_Z], center = true );} // low_mount
	translate([Airhole_spacing,-A_Base_Y/2-A_Wall_X/2-sep+F_Plug_X/2,-A_Base_Z/2]){rotate ([90,90,0]) {cylinder(r = Airhole_R-Tol, h = F_Plug_X, center = true );}} // Plug hole1
	translate([0,-A_Base_Y/2-A_Wall_X/2-sep+F_Plug_X/2,-A_Base_Z/2]){rotate ([90,90,0]) {cylinder(r = Airhole_R-Tol, h = F_Plug_X, center = true );}} // Plug hole2
	translate([-Airhole_spacing,-A_Base_Y/2-A_Wall_X/2-sep+F_Plug_X/2,-A_Base_Z/2]){rotate ([90,90,0]) {cylinder(r = Airhole_R-Tol, h = F_Plug_X, center = true );}} // Plug hole3
}
module F3_sub(){
	translate([Airhole_spacing,-A_Base_Y/2-A_Wall_X/2-sep+F_Plug_X/2,-A_Base_Z/2]){rotate ([90,90,0]) {cylinder(r = Airhole_R-Tube_wall, h = F_Plug_X*2, center = true );}} // Air holes
	translate([0,-A_Base_Y/2-A_Wall_X/2-sep+F_Plug_X/2,-A_Base_Z/2]){rotate ([90,90,0]) {cylinder(r = Airhole_R-Tube_wall, h = F_Plug_X*2, center = true );}} // Air holes
	translate([-Airhole_spacing,-A_Base_Y/2-A_Wall_X/2-sep+F_Plug_X/2,-A_Base_Z/2]){rotate ([90,90,0]) {cylinder(r = Airhole_R-Tube_wall, h = F_Plug_X*2, center = true );}} // Air holes
}
if (PartF3==1){difference(){F3();F3_sub();}}

/////////////////////////////////////////////////////////////////////////////////
///// MODULE G - links and thumbscrews //////////
/////////////////////////////////////////////////////////////////////////////////

G_Plug_X1 = 22; // tight fit
G_Plug_X2 = 32; // 1 cm extra
G_Plug_X3 = 42; // 2 cm extra
G_thumb_outer = 4;
G_thumb_ridge = 6;
G_thumb_ridge_Z = 5;
G_thumb_inner = 5.5/2;
G_thumb_inner_Z = 3;
G_thumb_Z = 10;

module G(){
	translate([Airhole_spacing,A_Base_Y/2+sep+G_Plug_X1/2,-A_Base_Z/2]){rotate ([90,90,0]) {cylinder(r = Airhole_R-Tol, h = G_Plug_X1, center = true );}} // Air holes
	translate([0,A_Base_Y/2+sep+G_Plug_X2/2,-A_Base_Z/2]){rotate ([90,90,0]) {cylinder(r = Airhole_R-Tol, h = G_Plug_X2, center = true );}} // Air holes
	translate([-Airhole_spacing,A_Base_Y/2+sep+G_Plug_X3/2,-A_Base_Z/2]){rotate ([90,90,0]) {cylinder(r = Airhole_R-Tol, h = G_Plug_X3, center = true );}} // Air holes
	translate([2*sep,2*sep,-A_Base_Z+G_thumb_Z/2]){rotate ([0,0,0]) {cylinder(r = G_thumb_outer, h = G_thumb_Z, center = true );}} // thumbscrew
	translate([2*sep,2*sep,-A_Base_Z+G_thumb_ridge_Z/2]){rotate ([0,0,0]) {cylinder(r = G_thumb_ridge, h = G_thumb_ridge_Z, center = true );}} // thumbscrew
}
module G_sub(){
	translate([Airhole_spacing,A_Base_Y/2+sep+G_Plug_X1/2,-A_Base_Z/2]){rotate ([90,90,0]) {cylinder(r = Airhole_R-Tube_wall, h = G_Plug_X1, center = true );}} // Air holes
	translate([0,A_Base_Y/2+sep+G_Plug_X2/2,-A_Base_Z/2]){rotate ([90,90,0]) {cylinder(r = Airhole_R-Tube_wall, h = G_Plug_X2, center = true );}} // Air holes
	translate([-Airhole_spacing,A_Base_Y/2+sep+G_Plug_X3/2,-A_Base_Z/2]){rotate ([90,90,0]) {cylinder(r = Airhole_R-Tube_wall, h = G_Plug_X3, center = true );}} // Air holes
	translate([2*sep,2*sep,-A_Base_Z+G_thumb_Z/2]){rotate ([0,0,0]) {cylinder(r = G_thumb_inner-3*Tol, h = G_thumb_Z, center = true );}} // thumbtop
	translate([2*sep,2*sep,-A_Base_Z+G_thumb_Z-G_thumb_inner_Z/2]){rotate ([0,0,0]) {cylinder(r = G_thumb_inner+Tol/2, h = G_thumb_inner_Z, center = true );}} // thumbhead
}
if (PartG==1){difference(){G();G_sub();}}

/////////////////////////////////////////////////////////////////////////////////
///// MODULE H - Adafruit 8x8 Matrix mount /////
/////////////////////////////////////////////////////////////////////////////////

Matrix_XY = 32;
Matrix_screwdistY = 28;
Matrix_screwdistX = 37;
Smini_hole_R = 1;

module H(){
	translate([sep+Cam_X_offset,0,Cam_Zfloat-2*sep]){cube([Cam_X+Walls*2,Cam_Y+Walls*2,Walls], center = true );} // Main
	translate([sep-P_XY/4-P_border/2-Walls,0,Cam_Zfloat-2*sep]){cube([P_XY/2+P_border+2*Walls,A_Wall_Y_long+2*Walls,Walls], center = true );} // LINK
}
module H_sub(){
	translate([sep+Cam_X_offset,0,Cam_Zfloat-2*sep]){cube([Matrix_XY+Tol*2,Matrix_XY+Tol*2,Walls], center = true );} // Main hole
	translate([sep+Cam_X_offset-Cam_X/2-CamGroove_X/2,0,Cam_Zfloat-2*sep+C_Z2/2]){cube([CamGroove_X,CamGroove_Y,C_Z2+Walls/2], center = true );} // Cable_groove
	translate([sep+Cam_X_offset-Cam_X/2-CamGroove_X/2-3,0,Cam_Zfloat-2*sep]){rotate ([0,0,0]) {cylinder(r = CamGroove_X/4, h = Walls, center = true );}} // Cable thre
	translate([sep+Matrix_screwdistX/2,Matrix_screwdistY/2,Cam_Zfloat-2*sep]){rotate ([0,0,0]) {cylinder(r = Smini_hole_R, h = 10, center = true );}} // Matrix_screwhole1
	translate([sep-Matrix_screwdistX/2,Matrix_screwdistY/2,Cam_Zfloat-2*sep]){rotate ([0,0,0]) {cylinder(r = Smini_hole_R, h = 10, center = true );}} // Matrix_screwhole2
	translate([sep+Matrix_screwdistX/2,-Matrix_screwdistY/2,Cam_Zfloat-2*sep]){rotate ([0,0,0]) {cylinder(r = Smini_hole_R, h = 10, center = true );}} // Matrix_screwhole3
	translate([sep+-Matrix_screwdistX/2,-Matrix_screwdistY/2,Cam_Zfloat-2*sep]){rotate ([0,0,0]) {cylinder(r = Smini_hole_R, h = 10, center = true );}} // Matrix_screwhole4
	translate([sep-P_XY/2-P_border-Walls/2,0,Cam_Zfloat-2*sep]){cube([Walls+Tol*2,A_Wall_Y_long+2*Tol,Walls*1.5], center = true );} // link_hole
	translate([sep-Cam_X/2-CamGroove_X-15,0,Cam_Zfloat-2*sep]){rotate ([0,90,0]) {cylinder(r = S_hole_R, h = 20, center = true );}} // link_screwhole
}
if (PartH==1){difference(){H();H_sub();}}

/////////////////////////////////////////////////////////////////////////////////
///// MODULE I - Adafruit 16LED ring mount //////
/////////////////////////////////////////////////////////////////////////////////

R_LEDring = 40/2;

module I(){
	translate([sep+Cam_X_offset,0,Cam_Zfloat-sep]){cube([Cam_X+Walls*2,Cam_Y+Walls*2,Walls], center = true );} // Main
	translate([sep-P_XY/4-P_border/2-Walls,0,Cam_Zfloat-sep]){cube([P_XY/2+P_border+2*Walls,A_Wall_Y_long+2*Walls,Walls], center = true );} // LINK
}
module I_sub(){
	translate([sep,0,Cam_Zfloat-sep]){rotate ([0,0,0]) {cylinder(r = R_LEDring-Tol, h = Walls, center = true );}} // Main hole
	translate([sep,0,Cam_Zfloat-sep+1]){rotate ([0,0,0]) {cylinder(r = R_LEDring+Tol, h = Walls, center = true );}} // Main hole
	translate([sep,R_LEDring/2+1.5,Cam_Zfloat-sep+1]){rotate ([0,0,0]) {cylinder(r = R_LEDring/2, h = Walls, center = true );}} // extra sidegrooves1
	translate([sep,-R_LEDring/2-1.5,Cam_Zfloat-sep+1]){rotate ([0,0,0]) {cylinder(r = R_LEDring/2, h = Walls, center = true );}} // extra sidegrooves2
	translate([sep-R_LEDring/2-1.5,0,Cam_Zfloat-sep+1]){rotate ([0,0,0]) {cylinder(r = R_LEDring/2, h = Walls, center = true );}} // extra sidegrooves3
	translate([sep+R_LEDring/2+1.5,0,Cam_Zfloat-sep+1]){rotate ([0,0,0]) {cylinder(r = R_LEDring/2, h = Walls, center = true );}} // extra sidegrooves4
	translate([sep+Cam_X_offset-Cam_X/2-CamGroove_X/2,0,Cam_Zfloat-sep+C_Z2/2]){cube([CamGroove_X,CamGroove_Y,C_Z2+Walls/2], center = true );} // Cable_groove
	translate([sep+Cam_X_offset-Cam_X/2-CamGroove_X/2-3,0,Cam_Zfloat-sep]){rotate ([0,0,0]) {cylinder(r = CamGroove_X/4, h = Walls, center = true );}} // Cable thread
	translate([sep-P_XY/2-P_border-Walls/2,0,Cam_Zfloat-sep]){cube([Walls+Tol*2,A_Wall_Y_long+2*Tol,Walls*1.5], center = true );} // link_hole
	translate([sep-Cam_X/2-CamGroove_X-15,0,Cam_Zfloat-sep]){rotate ([0,90,0]) {cylinder(r = S_hole_R, h = 20, center = true );}} // link_screwhole
}
if (PartI==1){difference(){I();I_sub();}}

/////////////////////////////////////////////////////////////////////////////////
///// MODULE J - mini petri dish mount ///////////////
/////////////////////////////////////////////////////////////////////////////////

Petri_R = 35/2; // 
Petri_R_outer = 39/2; // for lid

module J(){
	translate([sep+Cam_X_offset,0,Cam_Zfloat-3*sep]){cube([Cam_X+Walls*2,Cam_Y+Walls*2,Walls], center = true );} // Main
	translate([sep-P_XY/4-P_border/2-Walls,0,Cam_Zfloat-3*sep]){cube([P_XY/2+P_border+2*Walls,A_Wall_Y_long+2*Walls,Walls], center = true );} // LINK
}
module J_sub(){
	translate([sep,0,Cam_Zfloat-3*sep]){rotate ([0,0,0]) {cylinder(r = Petri_R_outer+Tol, h = Walls, center = true );}} // Main hole
	translate([sep-P_XY/2-P_border-Walls/2,0,Cam_Zfloat-3*sep]){cube([Walls+Tol*2,A_Wall_Y_long+2*Tol,Walls*1.5], center = true );} // link_hole
	translate([sep-Cam_X/2-CamGroove_X-15,0,Cam_Zfloat-3*sep]){rotate ([0,90,0]) {cylinder(r = S_hole_R, h = 20, center = true );}} // link_screwhole
}
if (PartJ1==1){difference(){J();J_sub();}}

/////////////////////////////////////////////////////////////////////////////////
///// MODULE J2 - midi petri dish mount /////////////
/////////////////////////////////////////////////////////////////////////////////

Petri2_R = 58.8/2; // 
Petri2_R_outer = 58.8/2; // for lid

module J2(){
	translate([sep+Cam_X_offset,0,Cam_Zfloat-4*sep]){cube([Walls+Petri2_R*2,Walls+Petri2_R*2,Walls], center = true );} // Main
	translate([sep-P_XY/4-P_border/2-Walls,0,Cam_Zfloat-4*sep]){cube([P_XY/2+P_border+2*Walls,A_Wall_Y_long+2*Walls,Walls], center = true );} // LINK
}
module J2_sub(){
	translate([sep,0,Cam_Zfloat-4*sep]){rotate ([0,0,0]) {cylinder(r = Petri2_R+Tol, h = Walls, center = true );}} // Main hole
	translate([sep-P_XY/2-P_border-Walls/2,0,Cam_Zfloat-4*sep]){cube([Walls+Tol*2,A_Wall_Y_long+2*Tol,Walls*1.5], center = true );} // link_hole
	translate([sep-Cam_X/2-CamGroove_X-15,0,Cam_Zfloat-4*sep]){rotate ([0,90,0]) {cylinder(r = S_hole_R, h = 20, center = true );}} // link_screwhole
}
if (PartJ2==1){difference(){J2();J2_sub();}}

/////////////////////////////////////////////////////////////////////////////////
///// MODULE K - diffuser mount /////////////////////////
/////////////////////////////////////////////////////////////////////////////////

Link_Opening = 1;
Diffuser_XY = 45;
Diffuser_XY_inner = 38.5+2*Tol;

module K(){
	translate([sep+Cam_X_offset,0,Cam_Zfloat-5*sep]){cube([Diffuser_XY,Diffuser_XY,Walls], center = true );} // Main
	translate([sep-P_XY/4-P_border/2-Walls,0,Cam_Zfloat-5*sep]){cube([P_XY/2+P_border+2*Walls,A_Wall_Y_long+2*Walls,Walls], center = true );} // LINK
}
module K_sub(){
	translate([sep+Cam_X_offset,0,Cam_Zfloat-5*sep]){cube([Diffuser_XY_inner,Diffuser_XY_inner,Walls], center = true );} // Main_hole
	translate([sep-P_XY/2-P_border-Walls/2,-5*Link_Opening,Cam_Zfloat-5*sep]){cube([Walls+Tol*2,A_Wall_Y_long+2*Tol+10*Link_Opening,Walls*1.5], center = true );} // link_hole
	translate([sep-Cam_X/2-CamGroove_X-15,0,Cam_Zfloat-5*sep]){rotate ([0,90,0]) {cylinder(r = S_hole_R, h = 20, center = true );}} // link_screwhole
}
if (PartK==1){difference(){K();K_sub();}}

/////////////////////////////////////////////////////////////////////////////////
///// MODULE L1 - small microsc. sl. chamber  //
/////////////////////////////////////////////////////////////////////////////////

Plug_R = 1.5;
Chamber1_Z = 1;
Slide1_Y = 25;
Slide1_X = Slide1_Y+10;
Slide1_Z = 1.5;

module L1(){
	translate([4*sep,0,0]){cube([Slide1_X,Slide1_Y,Chamber1_Z+Slide1_Z], center = true );} // Main 
	translate([4*sep,0,sep]){cube([Slide1_X,Slide1_Y,1], center = true );} // Lid 
	translate([4*sep+Slide1_Y/2+2.5,0,Chamber1_Z+sep]){rotate ([0,0,0]) {cylinder( $fn = 50, r = Plug_R, h = Slide1_Z, center = true );}} // Plug 
	translate([4*sep-Slide1_Y/2-2.5,0,Chamber1_Z+sep]){rotate ([0,0,0]) {cylinder( $fn = 50, r = Plug_R, h = Slide1_Z, center = true );}} // Plug 
}
module L1_sub(){
	translate([4*sep,0,0]){rotate ([0,0,0]) {cylinder(r = Slide1_Y/2-2, h = Chamber1_Z+Slide1_Z, center = true );}} // Main hole
	translate([4*sep,0,sep]){rotate ([0,0,0]) {cylinder(r = Slide1_Y/2-2, h = Chamber1_Z+Slide1_Z, center = true );}} // Lid hole
      translate([4*sep,0,Chamber1_Z]){cube([Slide1_Y+7*Tol,Slide1_X,Chamber1_Z+Slide1_Z], center = true );} // Lid groove 
	translate([4*sep+Slide1_Y/2+2.5,0,Chamber1_Z/2]){rotate ([0,0,0]) {cylinder( $fn = 50, r = Plug_R+Tol, h = Slide1_Z*2, center = true );}} // Plug hole
	translate([4*sep-Slide1_Y/2-2.5,0,Chamber1_Z/2]){rotate ([0,0,0]) {cylinder( $fn = 50, r = Plug_R+Tol, h = Slide1_Z*2, center = true );}} // Plug hole
}
if (PartL1==1){difference(){L1();L1_sub();}}

/////////////////////////////////////////////////////////////////////////////////
///// MODULE L2 - big microsc. sl. chamber  /////
/////////////////////////////////////////////////////////////////////////////////

Chamber2_Z = 1;
Slide2_Y = 50;
Slide2_X = Slide2_Y+10;
Slide2_Z = 1.5;

module L2(){
	translate([6*sep,0,0]){cube([Slide2_X,Slide2_Y,Chamber2_Z+Slide2_Z], center = true );} // Main 
	translate([6*sep,0,sep]){cube([Slide2_X,Slide2_Y,1], center = true );} // Lid 
	translate([6*sep+Slide2_Y/2+2.5,0,Chamber2_Z+sep]){rotate ([0,0,0]) {cylinder( $fn = 50, r = Plug_R, h = Slide2_Z, center = true );}} // Plug 
	translate([6*sep-Slide2_Y/2-2.5,0,Chamber2_Z+sep]){rotate ([0,0,0]) {cylinder( $fn = 50, r = Plug_R, h = Slide2_Z, center = true );}} // Plug 
}
module L2_sub(){
	translate([6*sep,0,0]){rotate ([0,0,0]) {cylinder(r = Slide2_Y/2-2, h = Chamber2_Z+Slide2_Z, center = true );}} // Main hole
	translate([6*sep,0,sep]){rotate ([0,0,0]) {cylinder(r = Slide2_Y/2-2, h = Chamber2_Z+Slide2_Z, center = true );}} // Lid hole   
	translate([6*sep,0,Chamber2_Z]){cube([Slide2_Y+7*Tol,Slide2_X,Chamber2_Z+Slide2_Z], center = true );} // Lid groove 
	translate([6*sep+Slide2_Y/2+2.5,0,Chamber2_Z/2]){rotate ([0,0,0]) {cylinder( $fn = 50, r = Plug_R+Tol, h = Slide2_Z*2, center = true );}} // Plug hole
	translate([6*sep-Slide2_Y/2-2.5,0,Chamber2_Z/2]){rotate ([0,0,0]) {cylinder( $fn = 50, r = Plug_R+Tol, h = Slide2_Z*2, center = true );}} // Plug hole
}
if (PartL2==1){difference(){L2();L2_sub();}}

/////////////////////////////////////////////////////////////////////////////////
///// MODULE M - fluor.excitation LED mount ////
/////////////////////////////////////////////////////////////////////////////////

Excit_hole_R = 11;
Excit_XY = 50;
Excit_tube_h = 40;
Excit_focal_depth = 5; // how far below base is focal point 
Vert_tube_h = 30;

module M(){
	translate([sep+Cam_X_offset,4*sep,Cam_Zfloat-5*sep-Walls/4]){cube([Excit_XY,Excit_XY,Walls/2], center = true );} // Main
	translate([sep-P_XY/4-P_border/2-Walls,4*sep,Cam_Zfloat-5*sep+Walls/2]){cube([P_XY/2+P_border+2*Walls,A_Wall_Y_long+2*Walls,Walls*2], center = true );} // LINK
	translate([sep,4*sep,Cam_Zfloat-5*sep+Vert_tube_h/2]){rotate ([0,0,0]) {cylinder(r = Excit_hole_R+Tube_wall, h = Vert_tube_h, center = true );}} // Vert_tube
	translate([sep,4*sep,Cam_Zfloat-5*sep-Excit_focal_depth-Walls/2]){rotate ([45,0,0]) {cylinder(r = Excit_hole_R+Tube_wall, h = Excit_tube_h*2, center = true );}} // Excit_tube	
	translate([sep,4*sep,Cam_Zfloat-5*sep-Excit_focal_depth-Walls/2]){rotate ([-45,0,0]) {cylinder(r = Excit_hole_R+Tube_wall, h = Excit_tube_h*2, center = true );}} // Excit_tbe	
}
module M_sub(){
	translate([sep,4*sep,Cam_Zfloat-5*sep+Vert_tube_h/2]){rotate ([0,0,0]) {cylinder(r = Excit_hole_R, h = Vert_tube_h*2, center = true );}} // Main hole	
	translate([sep,4*sep,Cam_Zfloat-5*sep-Excit_focal_depth-Walls/2]){rotate ([45,0,0]) {cylinder(r = Excit_hole_R, h = Excit_tube_h*2, center = true );}} // Excit_tube	
	translate([sep,4*sep,Cam_Zfloat-5*sep-Excit_focal_depth-Walls/2]){rotate ([-45,0,0]) {cylinder(r = Excit_hole_R, h = Excit_tube_h*2, center = true );}} // Excit_tube	
	translate([sep+Cam_X_offset,4*sep,Cam_Zfloat-5*sep-Walls/2-Excit_tube_h]){cube([Excit_XY,Excit_XY*2,Excit_tube_h*2], center = true );} // cut_below
	translate([sep-P_XY/2-P_border-Walls/2,4*sep,Cam_Zfloat-5*sep+Walls]){cube([Walls+Tol*2,A_Wall_Y_long+2*Tol,Walls*3], center = true );} // link_hole
	translate([sep-Cam_X/2-CamGroove_X-15,4*sep,Cam_Zfloat-5*sep+Walls/2]){rotate ([0,90,0]) {cylinder(r = S_hole_R, h = 20, center = true );}} // link_screwhole
}
if (PartM==1){difference(){M();M_sub();}}

/////////////////////////////////////////////////////////////////////////////////
///// MODULE N - fluor. excitation LED plug //////
/////////////////////////////////////////////////////////////////////////////////

N_Z1 = 2;
N_Z2 = 4; 

module N(){
	translate([sep,4*sep,Cam_Zfloat-3*sep+N_Z1/2]){rotate ([0,0,0]) {cylinder(r = Excit_hole_R+Tube_wall, h = N_Z1, center = true );}} // lid
	translate([sep,4*sep,Cam_Zfloat-3*sep-N_Z1/2]){rotate ([0,0,0]) {cylinder(r = Excit_hole_R-Tol, h = N_Z2, center = true );}} // plug	
}
module N_sub(){
	translate([sep,4*sep,Cam_Zfloat-3*sep-N_Z1/2]){rotate ([0,0,0]) {cylinder(r = Excit_hole_R-Tol-Tube_wall, h = N_Z2, center = true );}} // plug	
}
if (PartN==1){difference(){N();N_sub();}}

/////////////////////////////////////////////////////////////////////////////////
///// MODULE O - fluor emission filter mount /////
/////////////////////////////////////////////////////////////////////////////////

Emiss_hole_R = 8.5;
Emiss_Wheel_R = 30;
Emiss_pivot_hole_R = 3;
Emiss_pivot_hole_offset = 15;
Emiss_wheel_hole_R = Emiss_hole_R+0.5;
Emiss_wheel_h = 1;
Spacer_Z = 0.5;
Emiss_wheel_peg_Z = 8;

module O(){
	translate([sep+Cam_X_offset,4*sep,Cam_Zfloat-6*sep-Walls/4]){cube([Excit_XY,Excit_XY,Walls/2], center = true );} // Main
	translate([sep-P_XY/4-P_border/2-Walls*2,4*sep,Cam_Zfloat-6*sep-Walls/2]){cube([P_XY/2+P_border,A_Wall_Y_long+2*Walls,Walls], center = true );} // LINK
	translate([sep,4*sep+Emiss_pivot_hole_offset,Cam_Zfloat-5.5*sep]){rotate ([0,0,0]) {cylinder($fn = 50, r = Emiss_Wheel_R, h = Emiss_wheel_h, center = true );}} // Wheel
	translate([sep,4*sep+Emiss_pivot_hole_offset,Cam_Zfloat-5.5*sep-Spacer_Z/2-Emiss_wheel_h/2]){rotate ([0,0,0]) {cylinder($fn = 50, r = Emiss_pivot_hole_R+1, h = Spacer_Z, center = true );}} // Wheel_peg_spacer	
	translate([sep,4*sep+Emiss_pivot_hole_offset,Cam_Zfloat-5.5*sep-Emiss_wheel_peg_Z/2]){rotate ([0,0,0]) {cylinder($fn = 50, r = Emiss_pivot_hole_R-Tol, h = Emiss_wheel_peg_Z, center = true );}} // Wheel_peg		
	


}
module O_sub(){
	translate([sep,4*sep,Cam_Zfloat-6*sep]){rotate ([0,0,0]) {cylinder($fn = 50, r = Emiss_hole_R, h = Walls, center = true );}} // Main hole	
	translate([sep,4*sep+Emiss_pivot_hole_offset,Cam_Zfloat-6*sep]){rotate ([0,0,0]) {cylinder($fn = 50, r = Emiss_pivot_hole_R, h = Walls, center = true );}} // screw pivot hole	
	translate([sep-P_XY/2-P_border-Walls/2,4*sep,Cam_Zfloat-6*sep-Walls]){cube([Walls+Tol*2,A_Wall_Y_long+2*Tol,Walls*3], center = true );} // link_hole
	translate([sep-Cam_X/2-CamGroove_X-15,4*sep,Cam_Zfloat-6*sep-Walls/2]){rotate ([0,90,0]) {cylinder(r = S_hole_R, h = 20, center = true );}} // link_screwhole
	translate([sep,4*sep,Cam_Zfloat-5.5*sep]){rotate ([0,0,0]) {cylinder($fn = 50, r = Emiss_wheel_hole_R, h = Walls, center = true );}} // Wheel hole 1	
      translate([sep,4*sep+Emiss_pivot_hole_offset*2,Cam_Zfloat-5.5*sep]){rotate ([0,0,0]) {cylinder($fn = 50, r = Emiss_wheel_hole_R, h = Walls, center = true );}} // Wheel hole 2
      translate([sep-Emiss_pivot_hole_offset,4*sep+Emiss_pivot_hole_offset,Cam_Zfloat-5.5*sep]){rotate ([0,0,0]) {cylinder($fn = 50, r = Emiss_wheel_hole_R, h = Walls, center = true );}} // Wheel hole 3
      translate([sep+Emiss_pivot_hole_offset,4*sep+Emiss_pivot_hole_offset,Cam_Zfloat-5.5*sep]){rotate ([0,0,0]) {cylinder($fn = 50, r = Emiss_wheel_hole_R, h = Walls, center = true );}} // Wheel hole 4
}
if (PartO==1){difference(){O();O_sub();}}
